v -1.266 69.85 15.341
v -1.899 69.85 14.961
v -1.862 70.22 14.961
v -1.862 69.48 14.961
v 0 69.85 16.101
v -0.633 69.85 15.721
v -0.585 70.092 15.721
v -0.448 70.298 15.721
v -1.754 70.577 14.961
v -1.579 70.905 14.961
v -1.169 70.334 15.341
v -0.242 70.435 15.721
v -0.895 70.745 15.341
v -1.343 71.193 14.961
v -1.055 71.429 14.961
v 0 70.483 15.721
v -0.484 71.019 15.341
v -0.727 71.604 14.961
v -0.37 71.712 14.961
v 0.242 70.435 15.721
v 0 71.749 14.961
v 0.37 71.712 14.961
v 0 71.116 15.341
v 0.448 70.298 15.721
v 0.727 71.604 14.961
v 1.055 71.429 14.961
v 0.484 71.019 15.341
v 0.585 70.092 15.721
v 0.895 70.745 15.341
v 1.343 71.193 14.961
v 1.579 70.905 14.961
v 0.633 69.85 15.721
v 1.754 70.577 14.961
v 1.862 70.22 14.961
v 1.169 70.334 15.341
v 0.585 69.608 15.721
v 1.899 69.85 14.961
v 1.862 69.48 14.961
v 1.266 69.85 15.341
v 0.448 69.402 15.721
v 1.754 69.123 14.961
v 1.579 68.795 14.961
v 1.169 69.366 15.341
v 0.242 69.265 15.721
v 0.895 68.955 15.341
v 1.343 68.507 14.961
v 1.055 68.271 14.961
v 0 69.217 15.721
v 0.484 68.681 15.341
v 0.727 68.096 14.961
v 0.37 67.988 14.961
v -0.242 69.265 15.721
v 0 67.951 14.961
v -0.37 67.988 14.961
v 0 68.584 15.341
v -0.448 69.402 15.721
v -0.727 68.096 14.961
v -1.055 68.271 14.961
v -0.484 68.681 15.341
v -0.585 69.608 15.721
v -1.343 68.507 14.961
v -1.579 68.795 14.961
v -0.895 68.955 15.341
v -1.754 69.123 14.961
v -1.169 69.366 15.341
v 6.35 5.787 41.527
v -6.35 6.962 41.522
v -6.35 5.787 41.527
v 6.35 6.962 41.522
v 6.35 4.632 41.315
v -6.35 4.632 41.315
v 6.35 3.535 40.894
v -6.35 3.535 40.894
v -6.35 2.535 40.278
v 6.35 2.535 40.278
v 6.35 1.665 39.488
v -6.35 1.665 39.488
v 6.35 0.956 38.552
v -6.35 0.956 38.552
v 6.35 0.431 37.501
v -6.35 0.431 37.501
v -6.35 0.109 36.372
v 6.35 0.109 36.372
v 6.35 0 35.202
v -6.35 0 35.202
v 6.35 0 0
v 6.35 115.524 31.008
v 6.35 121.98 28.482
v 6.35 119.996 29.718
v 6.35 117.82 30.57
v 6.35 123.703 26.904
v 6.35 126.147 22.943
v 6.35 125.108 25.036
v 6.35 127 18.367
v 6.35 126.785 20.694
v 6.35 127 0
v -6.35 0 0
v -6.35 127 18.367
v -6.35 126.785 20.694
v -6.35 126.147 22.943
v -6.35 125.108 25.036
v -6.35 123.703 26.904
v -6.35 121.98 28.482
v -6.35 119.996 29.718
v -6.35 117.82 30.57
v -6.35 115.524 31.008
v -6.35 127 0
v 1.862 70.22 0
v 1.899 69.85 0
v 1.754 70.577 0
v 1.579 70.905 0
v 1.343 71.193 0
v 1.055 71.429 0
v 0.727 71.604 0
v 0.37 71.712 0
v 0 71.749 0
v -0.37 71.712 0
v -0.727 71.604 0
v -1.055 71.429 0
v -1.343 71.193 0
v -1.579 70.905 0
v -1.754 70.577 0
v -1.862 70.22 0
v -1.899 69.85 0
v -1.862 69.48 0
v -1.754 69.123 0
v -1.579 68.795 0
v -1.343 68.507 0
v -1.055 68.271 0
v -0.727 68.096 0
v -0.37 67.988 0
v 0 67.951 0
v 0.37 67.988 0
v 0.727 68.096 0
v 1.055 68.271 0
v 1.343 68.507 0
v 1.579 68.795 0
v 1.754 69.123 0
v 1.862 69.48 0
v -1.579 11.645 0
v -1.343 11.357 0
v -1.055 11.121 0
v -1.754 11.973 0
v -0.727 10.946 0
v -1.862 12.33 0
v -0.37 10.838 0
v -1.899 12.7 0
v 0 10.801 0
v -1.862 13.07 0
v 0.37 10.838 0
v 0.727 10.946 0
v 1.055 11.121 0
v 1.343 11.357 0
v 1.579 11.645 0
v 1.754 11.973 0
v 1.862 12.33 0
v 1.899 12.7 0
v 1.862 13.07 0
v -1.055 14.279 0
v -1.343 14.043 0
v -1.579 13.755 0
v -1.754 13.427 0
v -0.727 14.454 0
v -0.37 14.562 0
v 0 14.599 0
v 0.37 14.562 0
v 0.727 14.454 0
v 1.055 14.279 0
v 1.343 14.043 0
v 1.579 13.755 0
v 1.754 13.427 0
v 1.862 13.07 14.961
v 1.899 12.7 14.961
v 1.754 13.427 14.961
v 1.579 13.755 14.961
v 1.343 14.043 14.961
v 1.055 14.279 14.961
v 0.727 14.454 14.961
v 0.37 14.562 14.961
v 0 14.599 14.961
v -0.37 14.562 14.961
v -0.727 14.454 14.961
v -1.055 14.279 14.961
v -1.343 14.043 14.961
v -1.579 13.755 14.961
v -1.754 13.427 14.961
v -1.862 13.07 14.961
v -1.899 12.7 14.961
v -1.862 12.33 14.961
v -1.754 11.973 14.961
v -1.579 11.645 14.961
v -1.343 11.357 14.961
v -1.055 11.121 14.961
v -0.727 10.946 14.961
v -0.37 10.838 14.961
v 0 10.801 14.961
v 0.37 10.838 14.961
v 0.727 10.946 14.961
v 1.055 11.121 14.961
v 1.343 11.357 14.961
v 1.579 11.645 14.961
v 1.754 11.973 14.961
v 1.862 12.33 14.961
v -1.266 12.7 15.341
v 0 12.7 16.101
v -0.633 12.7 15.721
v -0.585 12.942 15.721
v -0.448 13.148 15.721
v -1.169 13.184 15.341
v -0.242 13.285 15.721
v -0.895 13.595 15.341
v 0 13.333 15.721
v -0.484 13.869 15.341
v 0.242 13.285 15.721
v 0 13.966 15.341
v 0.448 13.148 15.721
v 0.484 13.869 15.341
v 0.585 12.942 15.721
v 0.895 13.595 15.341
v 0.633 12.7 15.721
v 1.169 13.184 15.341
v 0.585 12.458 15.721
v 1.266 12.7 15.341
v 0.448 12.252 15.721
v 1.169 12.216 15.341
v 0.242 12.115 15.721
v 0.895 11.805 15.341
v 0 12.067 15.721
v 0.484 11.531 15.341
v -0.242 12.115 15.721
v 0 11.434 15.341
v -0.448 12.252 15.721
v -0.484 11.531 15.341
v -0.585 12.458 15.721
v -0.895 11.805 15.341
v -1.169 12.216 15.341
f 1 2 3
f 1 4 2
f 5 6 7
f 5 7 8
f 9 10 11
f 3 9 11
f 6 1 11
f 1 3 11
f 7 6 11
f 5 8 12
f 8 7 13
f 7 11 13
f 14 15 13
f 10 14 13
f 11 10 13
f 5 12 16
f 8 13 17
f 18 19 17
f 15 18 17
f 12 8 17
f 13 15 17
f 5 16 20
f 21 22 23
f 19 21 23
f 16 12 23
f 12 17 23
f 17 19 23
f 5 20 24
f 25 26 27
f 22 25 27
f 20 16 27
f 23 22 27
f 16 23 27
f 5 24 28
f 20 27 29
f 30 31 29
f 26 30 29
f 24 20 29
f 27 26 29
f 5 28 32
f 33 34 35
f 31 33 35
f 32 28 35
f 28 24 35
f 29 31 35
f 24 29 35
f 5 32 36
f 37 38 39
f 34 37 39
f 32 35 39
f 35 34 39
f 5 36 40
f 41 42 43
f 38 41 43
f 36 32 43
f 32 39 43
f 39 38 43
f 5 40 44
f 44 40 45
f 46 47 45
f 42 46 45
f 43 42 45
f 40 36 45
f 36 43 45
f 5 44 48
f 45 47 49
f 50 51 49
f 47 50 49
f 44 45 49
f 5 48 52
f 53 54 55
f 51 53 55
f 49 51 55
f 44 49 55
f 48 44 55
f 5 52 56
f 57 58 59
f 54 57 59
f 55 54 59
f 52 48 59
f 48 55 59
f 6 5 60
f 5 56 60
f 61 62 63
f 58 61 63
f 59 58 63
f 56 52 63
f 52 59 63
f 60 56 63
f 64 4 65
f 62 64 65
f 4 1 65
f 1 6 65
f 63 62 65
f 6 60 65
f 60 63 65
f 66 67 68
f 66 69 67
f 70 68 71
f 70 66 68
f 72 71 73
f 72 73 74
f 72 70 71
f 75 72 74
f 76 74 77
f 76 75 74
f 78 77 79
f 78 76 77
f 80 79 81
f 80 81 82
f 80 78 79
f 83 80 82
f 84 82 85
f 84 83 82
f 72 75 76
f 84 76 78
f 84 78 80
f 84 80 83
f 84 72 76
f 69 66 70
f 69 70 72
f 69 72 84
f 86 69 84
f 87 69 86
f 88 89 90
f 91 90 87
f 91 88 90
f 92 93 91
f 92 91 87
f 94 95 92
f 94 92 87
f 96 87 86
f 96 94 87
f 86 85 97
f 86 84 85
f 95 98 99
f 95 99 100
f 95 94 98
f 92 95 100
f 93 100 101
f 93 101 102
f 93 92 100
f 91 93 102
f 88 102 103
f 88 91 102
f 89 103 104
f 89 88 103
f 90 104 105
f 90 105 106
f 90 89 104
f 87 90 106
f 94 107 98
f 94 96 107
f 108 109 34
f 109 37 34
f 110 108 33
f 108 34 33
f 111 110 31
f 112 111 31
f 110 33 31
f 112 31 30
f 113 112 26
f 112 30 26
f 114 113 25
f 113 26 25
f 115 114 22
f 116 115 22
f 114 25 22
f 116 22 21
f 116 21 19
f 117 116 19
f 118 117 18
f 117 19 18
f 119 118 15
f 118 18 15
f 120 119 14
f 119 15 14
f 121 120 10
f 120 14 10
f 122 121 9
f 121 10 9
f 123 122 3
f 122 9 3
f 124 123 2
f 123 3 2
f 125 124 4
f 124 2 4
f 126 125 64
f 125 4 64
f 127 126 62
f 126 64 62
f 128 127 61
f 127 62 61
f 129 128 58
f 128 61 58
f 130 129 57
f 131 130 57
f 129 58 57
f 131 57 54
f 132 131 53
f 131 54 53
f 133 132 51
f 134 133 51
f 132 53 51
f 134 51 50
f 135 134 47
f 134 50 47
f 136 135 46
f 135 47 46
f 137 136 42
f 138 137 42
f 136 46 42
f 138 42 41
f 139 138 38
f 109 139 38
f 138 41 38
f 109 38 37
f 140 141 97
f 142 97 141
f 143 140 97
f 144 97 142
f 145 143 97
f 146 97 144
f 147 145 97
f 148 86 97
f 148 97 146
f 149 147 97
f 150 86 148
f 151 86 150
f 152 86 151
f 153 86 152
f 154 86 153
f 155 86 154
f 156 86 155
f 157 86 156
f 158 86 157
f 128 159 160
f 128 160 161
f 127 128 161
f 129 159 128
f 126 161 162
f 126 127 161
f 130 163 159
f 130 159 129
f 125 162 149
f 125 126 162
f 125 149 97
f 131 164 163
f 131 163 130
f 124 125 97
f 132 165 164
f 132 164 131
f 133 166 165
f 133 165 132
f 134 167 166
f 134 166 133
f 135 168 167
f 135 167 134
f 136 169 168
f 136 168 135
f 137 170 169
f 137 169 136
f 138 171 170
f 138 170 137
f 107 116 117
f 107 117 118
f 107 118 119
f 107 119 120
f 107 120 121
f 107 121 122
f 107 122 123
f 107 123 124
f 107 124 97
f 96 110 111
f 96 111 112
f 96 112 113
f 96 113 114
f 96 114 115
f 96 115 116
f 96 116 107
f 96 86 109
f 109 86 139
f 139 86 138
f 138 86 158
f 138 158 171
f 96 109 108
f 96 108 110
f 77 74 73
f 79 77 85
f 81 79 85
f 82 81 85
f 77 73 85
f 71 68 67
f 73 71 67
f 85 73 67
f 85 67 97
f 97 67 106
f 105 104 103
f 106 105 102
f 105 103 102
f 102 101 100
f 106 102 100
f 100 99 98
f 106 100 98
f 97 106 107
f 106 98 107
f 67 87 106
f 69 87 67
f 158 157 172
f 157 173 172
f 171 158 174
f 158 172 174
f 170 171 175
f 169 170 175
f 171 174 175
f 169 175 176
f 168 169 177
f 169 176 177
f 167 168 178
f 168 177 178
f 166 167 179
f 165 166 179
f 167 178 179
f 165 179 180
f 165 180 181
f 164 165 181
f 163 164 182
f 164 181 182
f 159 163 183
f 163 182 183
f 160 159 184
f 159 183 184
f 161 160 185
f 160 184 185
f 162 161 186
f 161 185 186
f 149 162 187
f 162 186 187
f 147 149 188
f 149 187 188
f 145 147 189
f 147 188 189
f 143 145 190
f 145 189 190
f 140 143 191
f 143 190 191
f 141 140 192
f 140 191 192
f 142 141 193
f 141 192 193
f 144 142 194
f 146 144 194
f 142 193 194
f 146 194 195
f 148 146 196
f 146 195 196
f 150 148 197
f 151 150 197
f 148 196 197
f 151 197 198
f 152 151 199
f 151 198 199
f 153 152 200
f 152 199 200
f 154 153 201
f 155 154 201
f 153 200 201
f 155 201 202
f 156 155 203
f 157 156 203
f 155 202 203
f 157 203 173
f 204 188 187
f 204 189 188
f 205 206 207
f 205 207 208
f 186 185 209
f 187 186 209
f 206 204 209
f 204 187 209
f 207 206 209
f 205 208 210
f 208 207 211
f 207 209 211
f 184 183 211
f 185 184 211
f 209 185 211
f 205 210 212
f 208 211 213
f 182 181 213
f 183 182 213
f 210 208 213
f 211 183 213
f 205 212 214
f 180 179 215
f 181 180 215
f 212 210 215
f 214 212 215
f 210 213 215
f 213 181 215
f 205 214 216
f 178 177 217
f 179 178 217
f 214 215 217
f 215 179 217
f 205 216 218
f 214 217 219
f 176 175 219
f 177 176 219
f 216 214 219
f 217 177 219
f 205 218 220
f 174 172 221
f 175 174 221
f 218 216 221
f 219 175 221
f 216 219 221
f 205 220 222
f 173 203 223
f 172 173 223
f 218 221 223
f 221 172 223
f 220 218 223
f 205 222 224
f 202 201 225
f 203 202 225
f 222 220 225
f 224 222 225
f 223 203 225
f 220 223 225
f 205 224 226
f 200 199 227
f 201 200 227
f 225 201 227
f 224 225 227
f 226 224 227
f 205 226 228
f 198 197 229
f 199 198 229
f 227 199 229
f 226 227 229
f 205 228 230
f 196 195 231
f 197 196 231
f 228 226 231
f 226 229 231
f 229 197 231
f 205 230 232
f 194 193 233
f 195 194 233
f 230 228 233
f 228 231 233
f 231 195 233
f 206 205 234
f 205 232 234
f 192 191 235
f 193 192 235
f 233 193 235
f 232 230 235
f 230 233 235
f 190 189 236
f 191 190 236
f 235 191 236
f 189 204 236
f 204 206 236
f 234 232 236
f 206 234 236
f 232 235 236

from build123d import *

# Parameters (mm, degrees)
BOSS_EXTRUDE1_DEPTH        = 6.35
F_10_24_TAPPED_HOLE1_D     = 3.7973
F_10_24_TAPPED_HOLE1_DEPTH = 14.9606
F_10_24_TAPPED_HOLE1_TIP   = 1.140824014
FILLET1_R                  = 12.7


with BuildPart() as part:
    # Sketch1 → Boss-Extrude1 (new, symmetric)
    with BuildSketch(Plane(origin=(0, 0, 0), x_dir=(0, 0, -1), z_dir=(1, 0, 0))):
        with BuildLine():
            Line((0, 0), (0, 127))
            Line((0, 127), (-29.89679252, 127))
            Line((-29.89679252, 127), (-41.522242414, 6.962121916))
            ThreePointArc((-41.522242414, 6.962121916), (-39.903382192, 2.08177286), (-35.201814678, 0))
            Line((-35.201814678, 0), (0, 0))
        make_face()
    extrude(amount=BOSS_EXTRUDE1_DEPTH, both=True)

    # #10-24 Tapped Hole1
    with Locations(Plane(origin=(0, 0, 0), x_dir=(-1, 0, 0), z_dir=(0, 0, -1))):
        with Locations((0, 12.7), (0, 69.85)):
            Hole(F_10_24_TAPPED_HOLE1_D / 2, depth=F_10_24_TAPPED_HOLE1_DEPTH)
            with Locations((0, 0, -(F_10_24_TAPPED_HOLE1_DEPTH + F_10_24_TAPPED_HOLE1_TIP / 2))):  # 118° drill point
                Cone(0, F_10_24_TAPPED_HOLE1_D / 2, F_10_24_TAPPED_HOLE1_TIP, mode=Mode.SUBTRACT)

    # Fillet1
    fillet1_edges = [part.edges().sort_by_distance(p)[0] for p in [
        (0, 127, 29.89679252),
    ]]
    fillet(fillet1_edges, radius=FILLET1_R)


solid = part.part
